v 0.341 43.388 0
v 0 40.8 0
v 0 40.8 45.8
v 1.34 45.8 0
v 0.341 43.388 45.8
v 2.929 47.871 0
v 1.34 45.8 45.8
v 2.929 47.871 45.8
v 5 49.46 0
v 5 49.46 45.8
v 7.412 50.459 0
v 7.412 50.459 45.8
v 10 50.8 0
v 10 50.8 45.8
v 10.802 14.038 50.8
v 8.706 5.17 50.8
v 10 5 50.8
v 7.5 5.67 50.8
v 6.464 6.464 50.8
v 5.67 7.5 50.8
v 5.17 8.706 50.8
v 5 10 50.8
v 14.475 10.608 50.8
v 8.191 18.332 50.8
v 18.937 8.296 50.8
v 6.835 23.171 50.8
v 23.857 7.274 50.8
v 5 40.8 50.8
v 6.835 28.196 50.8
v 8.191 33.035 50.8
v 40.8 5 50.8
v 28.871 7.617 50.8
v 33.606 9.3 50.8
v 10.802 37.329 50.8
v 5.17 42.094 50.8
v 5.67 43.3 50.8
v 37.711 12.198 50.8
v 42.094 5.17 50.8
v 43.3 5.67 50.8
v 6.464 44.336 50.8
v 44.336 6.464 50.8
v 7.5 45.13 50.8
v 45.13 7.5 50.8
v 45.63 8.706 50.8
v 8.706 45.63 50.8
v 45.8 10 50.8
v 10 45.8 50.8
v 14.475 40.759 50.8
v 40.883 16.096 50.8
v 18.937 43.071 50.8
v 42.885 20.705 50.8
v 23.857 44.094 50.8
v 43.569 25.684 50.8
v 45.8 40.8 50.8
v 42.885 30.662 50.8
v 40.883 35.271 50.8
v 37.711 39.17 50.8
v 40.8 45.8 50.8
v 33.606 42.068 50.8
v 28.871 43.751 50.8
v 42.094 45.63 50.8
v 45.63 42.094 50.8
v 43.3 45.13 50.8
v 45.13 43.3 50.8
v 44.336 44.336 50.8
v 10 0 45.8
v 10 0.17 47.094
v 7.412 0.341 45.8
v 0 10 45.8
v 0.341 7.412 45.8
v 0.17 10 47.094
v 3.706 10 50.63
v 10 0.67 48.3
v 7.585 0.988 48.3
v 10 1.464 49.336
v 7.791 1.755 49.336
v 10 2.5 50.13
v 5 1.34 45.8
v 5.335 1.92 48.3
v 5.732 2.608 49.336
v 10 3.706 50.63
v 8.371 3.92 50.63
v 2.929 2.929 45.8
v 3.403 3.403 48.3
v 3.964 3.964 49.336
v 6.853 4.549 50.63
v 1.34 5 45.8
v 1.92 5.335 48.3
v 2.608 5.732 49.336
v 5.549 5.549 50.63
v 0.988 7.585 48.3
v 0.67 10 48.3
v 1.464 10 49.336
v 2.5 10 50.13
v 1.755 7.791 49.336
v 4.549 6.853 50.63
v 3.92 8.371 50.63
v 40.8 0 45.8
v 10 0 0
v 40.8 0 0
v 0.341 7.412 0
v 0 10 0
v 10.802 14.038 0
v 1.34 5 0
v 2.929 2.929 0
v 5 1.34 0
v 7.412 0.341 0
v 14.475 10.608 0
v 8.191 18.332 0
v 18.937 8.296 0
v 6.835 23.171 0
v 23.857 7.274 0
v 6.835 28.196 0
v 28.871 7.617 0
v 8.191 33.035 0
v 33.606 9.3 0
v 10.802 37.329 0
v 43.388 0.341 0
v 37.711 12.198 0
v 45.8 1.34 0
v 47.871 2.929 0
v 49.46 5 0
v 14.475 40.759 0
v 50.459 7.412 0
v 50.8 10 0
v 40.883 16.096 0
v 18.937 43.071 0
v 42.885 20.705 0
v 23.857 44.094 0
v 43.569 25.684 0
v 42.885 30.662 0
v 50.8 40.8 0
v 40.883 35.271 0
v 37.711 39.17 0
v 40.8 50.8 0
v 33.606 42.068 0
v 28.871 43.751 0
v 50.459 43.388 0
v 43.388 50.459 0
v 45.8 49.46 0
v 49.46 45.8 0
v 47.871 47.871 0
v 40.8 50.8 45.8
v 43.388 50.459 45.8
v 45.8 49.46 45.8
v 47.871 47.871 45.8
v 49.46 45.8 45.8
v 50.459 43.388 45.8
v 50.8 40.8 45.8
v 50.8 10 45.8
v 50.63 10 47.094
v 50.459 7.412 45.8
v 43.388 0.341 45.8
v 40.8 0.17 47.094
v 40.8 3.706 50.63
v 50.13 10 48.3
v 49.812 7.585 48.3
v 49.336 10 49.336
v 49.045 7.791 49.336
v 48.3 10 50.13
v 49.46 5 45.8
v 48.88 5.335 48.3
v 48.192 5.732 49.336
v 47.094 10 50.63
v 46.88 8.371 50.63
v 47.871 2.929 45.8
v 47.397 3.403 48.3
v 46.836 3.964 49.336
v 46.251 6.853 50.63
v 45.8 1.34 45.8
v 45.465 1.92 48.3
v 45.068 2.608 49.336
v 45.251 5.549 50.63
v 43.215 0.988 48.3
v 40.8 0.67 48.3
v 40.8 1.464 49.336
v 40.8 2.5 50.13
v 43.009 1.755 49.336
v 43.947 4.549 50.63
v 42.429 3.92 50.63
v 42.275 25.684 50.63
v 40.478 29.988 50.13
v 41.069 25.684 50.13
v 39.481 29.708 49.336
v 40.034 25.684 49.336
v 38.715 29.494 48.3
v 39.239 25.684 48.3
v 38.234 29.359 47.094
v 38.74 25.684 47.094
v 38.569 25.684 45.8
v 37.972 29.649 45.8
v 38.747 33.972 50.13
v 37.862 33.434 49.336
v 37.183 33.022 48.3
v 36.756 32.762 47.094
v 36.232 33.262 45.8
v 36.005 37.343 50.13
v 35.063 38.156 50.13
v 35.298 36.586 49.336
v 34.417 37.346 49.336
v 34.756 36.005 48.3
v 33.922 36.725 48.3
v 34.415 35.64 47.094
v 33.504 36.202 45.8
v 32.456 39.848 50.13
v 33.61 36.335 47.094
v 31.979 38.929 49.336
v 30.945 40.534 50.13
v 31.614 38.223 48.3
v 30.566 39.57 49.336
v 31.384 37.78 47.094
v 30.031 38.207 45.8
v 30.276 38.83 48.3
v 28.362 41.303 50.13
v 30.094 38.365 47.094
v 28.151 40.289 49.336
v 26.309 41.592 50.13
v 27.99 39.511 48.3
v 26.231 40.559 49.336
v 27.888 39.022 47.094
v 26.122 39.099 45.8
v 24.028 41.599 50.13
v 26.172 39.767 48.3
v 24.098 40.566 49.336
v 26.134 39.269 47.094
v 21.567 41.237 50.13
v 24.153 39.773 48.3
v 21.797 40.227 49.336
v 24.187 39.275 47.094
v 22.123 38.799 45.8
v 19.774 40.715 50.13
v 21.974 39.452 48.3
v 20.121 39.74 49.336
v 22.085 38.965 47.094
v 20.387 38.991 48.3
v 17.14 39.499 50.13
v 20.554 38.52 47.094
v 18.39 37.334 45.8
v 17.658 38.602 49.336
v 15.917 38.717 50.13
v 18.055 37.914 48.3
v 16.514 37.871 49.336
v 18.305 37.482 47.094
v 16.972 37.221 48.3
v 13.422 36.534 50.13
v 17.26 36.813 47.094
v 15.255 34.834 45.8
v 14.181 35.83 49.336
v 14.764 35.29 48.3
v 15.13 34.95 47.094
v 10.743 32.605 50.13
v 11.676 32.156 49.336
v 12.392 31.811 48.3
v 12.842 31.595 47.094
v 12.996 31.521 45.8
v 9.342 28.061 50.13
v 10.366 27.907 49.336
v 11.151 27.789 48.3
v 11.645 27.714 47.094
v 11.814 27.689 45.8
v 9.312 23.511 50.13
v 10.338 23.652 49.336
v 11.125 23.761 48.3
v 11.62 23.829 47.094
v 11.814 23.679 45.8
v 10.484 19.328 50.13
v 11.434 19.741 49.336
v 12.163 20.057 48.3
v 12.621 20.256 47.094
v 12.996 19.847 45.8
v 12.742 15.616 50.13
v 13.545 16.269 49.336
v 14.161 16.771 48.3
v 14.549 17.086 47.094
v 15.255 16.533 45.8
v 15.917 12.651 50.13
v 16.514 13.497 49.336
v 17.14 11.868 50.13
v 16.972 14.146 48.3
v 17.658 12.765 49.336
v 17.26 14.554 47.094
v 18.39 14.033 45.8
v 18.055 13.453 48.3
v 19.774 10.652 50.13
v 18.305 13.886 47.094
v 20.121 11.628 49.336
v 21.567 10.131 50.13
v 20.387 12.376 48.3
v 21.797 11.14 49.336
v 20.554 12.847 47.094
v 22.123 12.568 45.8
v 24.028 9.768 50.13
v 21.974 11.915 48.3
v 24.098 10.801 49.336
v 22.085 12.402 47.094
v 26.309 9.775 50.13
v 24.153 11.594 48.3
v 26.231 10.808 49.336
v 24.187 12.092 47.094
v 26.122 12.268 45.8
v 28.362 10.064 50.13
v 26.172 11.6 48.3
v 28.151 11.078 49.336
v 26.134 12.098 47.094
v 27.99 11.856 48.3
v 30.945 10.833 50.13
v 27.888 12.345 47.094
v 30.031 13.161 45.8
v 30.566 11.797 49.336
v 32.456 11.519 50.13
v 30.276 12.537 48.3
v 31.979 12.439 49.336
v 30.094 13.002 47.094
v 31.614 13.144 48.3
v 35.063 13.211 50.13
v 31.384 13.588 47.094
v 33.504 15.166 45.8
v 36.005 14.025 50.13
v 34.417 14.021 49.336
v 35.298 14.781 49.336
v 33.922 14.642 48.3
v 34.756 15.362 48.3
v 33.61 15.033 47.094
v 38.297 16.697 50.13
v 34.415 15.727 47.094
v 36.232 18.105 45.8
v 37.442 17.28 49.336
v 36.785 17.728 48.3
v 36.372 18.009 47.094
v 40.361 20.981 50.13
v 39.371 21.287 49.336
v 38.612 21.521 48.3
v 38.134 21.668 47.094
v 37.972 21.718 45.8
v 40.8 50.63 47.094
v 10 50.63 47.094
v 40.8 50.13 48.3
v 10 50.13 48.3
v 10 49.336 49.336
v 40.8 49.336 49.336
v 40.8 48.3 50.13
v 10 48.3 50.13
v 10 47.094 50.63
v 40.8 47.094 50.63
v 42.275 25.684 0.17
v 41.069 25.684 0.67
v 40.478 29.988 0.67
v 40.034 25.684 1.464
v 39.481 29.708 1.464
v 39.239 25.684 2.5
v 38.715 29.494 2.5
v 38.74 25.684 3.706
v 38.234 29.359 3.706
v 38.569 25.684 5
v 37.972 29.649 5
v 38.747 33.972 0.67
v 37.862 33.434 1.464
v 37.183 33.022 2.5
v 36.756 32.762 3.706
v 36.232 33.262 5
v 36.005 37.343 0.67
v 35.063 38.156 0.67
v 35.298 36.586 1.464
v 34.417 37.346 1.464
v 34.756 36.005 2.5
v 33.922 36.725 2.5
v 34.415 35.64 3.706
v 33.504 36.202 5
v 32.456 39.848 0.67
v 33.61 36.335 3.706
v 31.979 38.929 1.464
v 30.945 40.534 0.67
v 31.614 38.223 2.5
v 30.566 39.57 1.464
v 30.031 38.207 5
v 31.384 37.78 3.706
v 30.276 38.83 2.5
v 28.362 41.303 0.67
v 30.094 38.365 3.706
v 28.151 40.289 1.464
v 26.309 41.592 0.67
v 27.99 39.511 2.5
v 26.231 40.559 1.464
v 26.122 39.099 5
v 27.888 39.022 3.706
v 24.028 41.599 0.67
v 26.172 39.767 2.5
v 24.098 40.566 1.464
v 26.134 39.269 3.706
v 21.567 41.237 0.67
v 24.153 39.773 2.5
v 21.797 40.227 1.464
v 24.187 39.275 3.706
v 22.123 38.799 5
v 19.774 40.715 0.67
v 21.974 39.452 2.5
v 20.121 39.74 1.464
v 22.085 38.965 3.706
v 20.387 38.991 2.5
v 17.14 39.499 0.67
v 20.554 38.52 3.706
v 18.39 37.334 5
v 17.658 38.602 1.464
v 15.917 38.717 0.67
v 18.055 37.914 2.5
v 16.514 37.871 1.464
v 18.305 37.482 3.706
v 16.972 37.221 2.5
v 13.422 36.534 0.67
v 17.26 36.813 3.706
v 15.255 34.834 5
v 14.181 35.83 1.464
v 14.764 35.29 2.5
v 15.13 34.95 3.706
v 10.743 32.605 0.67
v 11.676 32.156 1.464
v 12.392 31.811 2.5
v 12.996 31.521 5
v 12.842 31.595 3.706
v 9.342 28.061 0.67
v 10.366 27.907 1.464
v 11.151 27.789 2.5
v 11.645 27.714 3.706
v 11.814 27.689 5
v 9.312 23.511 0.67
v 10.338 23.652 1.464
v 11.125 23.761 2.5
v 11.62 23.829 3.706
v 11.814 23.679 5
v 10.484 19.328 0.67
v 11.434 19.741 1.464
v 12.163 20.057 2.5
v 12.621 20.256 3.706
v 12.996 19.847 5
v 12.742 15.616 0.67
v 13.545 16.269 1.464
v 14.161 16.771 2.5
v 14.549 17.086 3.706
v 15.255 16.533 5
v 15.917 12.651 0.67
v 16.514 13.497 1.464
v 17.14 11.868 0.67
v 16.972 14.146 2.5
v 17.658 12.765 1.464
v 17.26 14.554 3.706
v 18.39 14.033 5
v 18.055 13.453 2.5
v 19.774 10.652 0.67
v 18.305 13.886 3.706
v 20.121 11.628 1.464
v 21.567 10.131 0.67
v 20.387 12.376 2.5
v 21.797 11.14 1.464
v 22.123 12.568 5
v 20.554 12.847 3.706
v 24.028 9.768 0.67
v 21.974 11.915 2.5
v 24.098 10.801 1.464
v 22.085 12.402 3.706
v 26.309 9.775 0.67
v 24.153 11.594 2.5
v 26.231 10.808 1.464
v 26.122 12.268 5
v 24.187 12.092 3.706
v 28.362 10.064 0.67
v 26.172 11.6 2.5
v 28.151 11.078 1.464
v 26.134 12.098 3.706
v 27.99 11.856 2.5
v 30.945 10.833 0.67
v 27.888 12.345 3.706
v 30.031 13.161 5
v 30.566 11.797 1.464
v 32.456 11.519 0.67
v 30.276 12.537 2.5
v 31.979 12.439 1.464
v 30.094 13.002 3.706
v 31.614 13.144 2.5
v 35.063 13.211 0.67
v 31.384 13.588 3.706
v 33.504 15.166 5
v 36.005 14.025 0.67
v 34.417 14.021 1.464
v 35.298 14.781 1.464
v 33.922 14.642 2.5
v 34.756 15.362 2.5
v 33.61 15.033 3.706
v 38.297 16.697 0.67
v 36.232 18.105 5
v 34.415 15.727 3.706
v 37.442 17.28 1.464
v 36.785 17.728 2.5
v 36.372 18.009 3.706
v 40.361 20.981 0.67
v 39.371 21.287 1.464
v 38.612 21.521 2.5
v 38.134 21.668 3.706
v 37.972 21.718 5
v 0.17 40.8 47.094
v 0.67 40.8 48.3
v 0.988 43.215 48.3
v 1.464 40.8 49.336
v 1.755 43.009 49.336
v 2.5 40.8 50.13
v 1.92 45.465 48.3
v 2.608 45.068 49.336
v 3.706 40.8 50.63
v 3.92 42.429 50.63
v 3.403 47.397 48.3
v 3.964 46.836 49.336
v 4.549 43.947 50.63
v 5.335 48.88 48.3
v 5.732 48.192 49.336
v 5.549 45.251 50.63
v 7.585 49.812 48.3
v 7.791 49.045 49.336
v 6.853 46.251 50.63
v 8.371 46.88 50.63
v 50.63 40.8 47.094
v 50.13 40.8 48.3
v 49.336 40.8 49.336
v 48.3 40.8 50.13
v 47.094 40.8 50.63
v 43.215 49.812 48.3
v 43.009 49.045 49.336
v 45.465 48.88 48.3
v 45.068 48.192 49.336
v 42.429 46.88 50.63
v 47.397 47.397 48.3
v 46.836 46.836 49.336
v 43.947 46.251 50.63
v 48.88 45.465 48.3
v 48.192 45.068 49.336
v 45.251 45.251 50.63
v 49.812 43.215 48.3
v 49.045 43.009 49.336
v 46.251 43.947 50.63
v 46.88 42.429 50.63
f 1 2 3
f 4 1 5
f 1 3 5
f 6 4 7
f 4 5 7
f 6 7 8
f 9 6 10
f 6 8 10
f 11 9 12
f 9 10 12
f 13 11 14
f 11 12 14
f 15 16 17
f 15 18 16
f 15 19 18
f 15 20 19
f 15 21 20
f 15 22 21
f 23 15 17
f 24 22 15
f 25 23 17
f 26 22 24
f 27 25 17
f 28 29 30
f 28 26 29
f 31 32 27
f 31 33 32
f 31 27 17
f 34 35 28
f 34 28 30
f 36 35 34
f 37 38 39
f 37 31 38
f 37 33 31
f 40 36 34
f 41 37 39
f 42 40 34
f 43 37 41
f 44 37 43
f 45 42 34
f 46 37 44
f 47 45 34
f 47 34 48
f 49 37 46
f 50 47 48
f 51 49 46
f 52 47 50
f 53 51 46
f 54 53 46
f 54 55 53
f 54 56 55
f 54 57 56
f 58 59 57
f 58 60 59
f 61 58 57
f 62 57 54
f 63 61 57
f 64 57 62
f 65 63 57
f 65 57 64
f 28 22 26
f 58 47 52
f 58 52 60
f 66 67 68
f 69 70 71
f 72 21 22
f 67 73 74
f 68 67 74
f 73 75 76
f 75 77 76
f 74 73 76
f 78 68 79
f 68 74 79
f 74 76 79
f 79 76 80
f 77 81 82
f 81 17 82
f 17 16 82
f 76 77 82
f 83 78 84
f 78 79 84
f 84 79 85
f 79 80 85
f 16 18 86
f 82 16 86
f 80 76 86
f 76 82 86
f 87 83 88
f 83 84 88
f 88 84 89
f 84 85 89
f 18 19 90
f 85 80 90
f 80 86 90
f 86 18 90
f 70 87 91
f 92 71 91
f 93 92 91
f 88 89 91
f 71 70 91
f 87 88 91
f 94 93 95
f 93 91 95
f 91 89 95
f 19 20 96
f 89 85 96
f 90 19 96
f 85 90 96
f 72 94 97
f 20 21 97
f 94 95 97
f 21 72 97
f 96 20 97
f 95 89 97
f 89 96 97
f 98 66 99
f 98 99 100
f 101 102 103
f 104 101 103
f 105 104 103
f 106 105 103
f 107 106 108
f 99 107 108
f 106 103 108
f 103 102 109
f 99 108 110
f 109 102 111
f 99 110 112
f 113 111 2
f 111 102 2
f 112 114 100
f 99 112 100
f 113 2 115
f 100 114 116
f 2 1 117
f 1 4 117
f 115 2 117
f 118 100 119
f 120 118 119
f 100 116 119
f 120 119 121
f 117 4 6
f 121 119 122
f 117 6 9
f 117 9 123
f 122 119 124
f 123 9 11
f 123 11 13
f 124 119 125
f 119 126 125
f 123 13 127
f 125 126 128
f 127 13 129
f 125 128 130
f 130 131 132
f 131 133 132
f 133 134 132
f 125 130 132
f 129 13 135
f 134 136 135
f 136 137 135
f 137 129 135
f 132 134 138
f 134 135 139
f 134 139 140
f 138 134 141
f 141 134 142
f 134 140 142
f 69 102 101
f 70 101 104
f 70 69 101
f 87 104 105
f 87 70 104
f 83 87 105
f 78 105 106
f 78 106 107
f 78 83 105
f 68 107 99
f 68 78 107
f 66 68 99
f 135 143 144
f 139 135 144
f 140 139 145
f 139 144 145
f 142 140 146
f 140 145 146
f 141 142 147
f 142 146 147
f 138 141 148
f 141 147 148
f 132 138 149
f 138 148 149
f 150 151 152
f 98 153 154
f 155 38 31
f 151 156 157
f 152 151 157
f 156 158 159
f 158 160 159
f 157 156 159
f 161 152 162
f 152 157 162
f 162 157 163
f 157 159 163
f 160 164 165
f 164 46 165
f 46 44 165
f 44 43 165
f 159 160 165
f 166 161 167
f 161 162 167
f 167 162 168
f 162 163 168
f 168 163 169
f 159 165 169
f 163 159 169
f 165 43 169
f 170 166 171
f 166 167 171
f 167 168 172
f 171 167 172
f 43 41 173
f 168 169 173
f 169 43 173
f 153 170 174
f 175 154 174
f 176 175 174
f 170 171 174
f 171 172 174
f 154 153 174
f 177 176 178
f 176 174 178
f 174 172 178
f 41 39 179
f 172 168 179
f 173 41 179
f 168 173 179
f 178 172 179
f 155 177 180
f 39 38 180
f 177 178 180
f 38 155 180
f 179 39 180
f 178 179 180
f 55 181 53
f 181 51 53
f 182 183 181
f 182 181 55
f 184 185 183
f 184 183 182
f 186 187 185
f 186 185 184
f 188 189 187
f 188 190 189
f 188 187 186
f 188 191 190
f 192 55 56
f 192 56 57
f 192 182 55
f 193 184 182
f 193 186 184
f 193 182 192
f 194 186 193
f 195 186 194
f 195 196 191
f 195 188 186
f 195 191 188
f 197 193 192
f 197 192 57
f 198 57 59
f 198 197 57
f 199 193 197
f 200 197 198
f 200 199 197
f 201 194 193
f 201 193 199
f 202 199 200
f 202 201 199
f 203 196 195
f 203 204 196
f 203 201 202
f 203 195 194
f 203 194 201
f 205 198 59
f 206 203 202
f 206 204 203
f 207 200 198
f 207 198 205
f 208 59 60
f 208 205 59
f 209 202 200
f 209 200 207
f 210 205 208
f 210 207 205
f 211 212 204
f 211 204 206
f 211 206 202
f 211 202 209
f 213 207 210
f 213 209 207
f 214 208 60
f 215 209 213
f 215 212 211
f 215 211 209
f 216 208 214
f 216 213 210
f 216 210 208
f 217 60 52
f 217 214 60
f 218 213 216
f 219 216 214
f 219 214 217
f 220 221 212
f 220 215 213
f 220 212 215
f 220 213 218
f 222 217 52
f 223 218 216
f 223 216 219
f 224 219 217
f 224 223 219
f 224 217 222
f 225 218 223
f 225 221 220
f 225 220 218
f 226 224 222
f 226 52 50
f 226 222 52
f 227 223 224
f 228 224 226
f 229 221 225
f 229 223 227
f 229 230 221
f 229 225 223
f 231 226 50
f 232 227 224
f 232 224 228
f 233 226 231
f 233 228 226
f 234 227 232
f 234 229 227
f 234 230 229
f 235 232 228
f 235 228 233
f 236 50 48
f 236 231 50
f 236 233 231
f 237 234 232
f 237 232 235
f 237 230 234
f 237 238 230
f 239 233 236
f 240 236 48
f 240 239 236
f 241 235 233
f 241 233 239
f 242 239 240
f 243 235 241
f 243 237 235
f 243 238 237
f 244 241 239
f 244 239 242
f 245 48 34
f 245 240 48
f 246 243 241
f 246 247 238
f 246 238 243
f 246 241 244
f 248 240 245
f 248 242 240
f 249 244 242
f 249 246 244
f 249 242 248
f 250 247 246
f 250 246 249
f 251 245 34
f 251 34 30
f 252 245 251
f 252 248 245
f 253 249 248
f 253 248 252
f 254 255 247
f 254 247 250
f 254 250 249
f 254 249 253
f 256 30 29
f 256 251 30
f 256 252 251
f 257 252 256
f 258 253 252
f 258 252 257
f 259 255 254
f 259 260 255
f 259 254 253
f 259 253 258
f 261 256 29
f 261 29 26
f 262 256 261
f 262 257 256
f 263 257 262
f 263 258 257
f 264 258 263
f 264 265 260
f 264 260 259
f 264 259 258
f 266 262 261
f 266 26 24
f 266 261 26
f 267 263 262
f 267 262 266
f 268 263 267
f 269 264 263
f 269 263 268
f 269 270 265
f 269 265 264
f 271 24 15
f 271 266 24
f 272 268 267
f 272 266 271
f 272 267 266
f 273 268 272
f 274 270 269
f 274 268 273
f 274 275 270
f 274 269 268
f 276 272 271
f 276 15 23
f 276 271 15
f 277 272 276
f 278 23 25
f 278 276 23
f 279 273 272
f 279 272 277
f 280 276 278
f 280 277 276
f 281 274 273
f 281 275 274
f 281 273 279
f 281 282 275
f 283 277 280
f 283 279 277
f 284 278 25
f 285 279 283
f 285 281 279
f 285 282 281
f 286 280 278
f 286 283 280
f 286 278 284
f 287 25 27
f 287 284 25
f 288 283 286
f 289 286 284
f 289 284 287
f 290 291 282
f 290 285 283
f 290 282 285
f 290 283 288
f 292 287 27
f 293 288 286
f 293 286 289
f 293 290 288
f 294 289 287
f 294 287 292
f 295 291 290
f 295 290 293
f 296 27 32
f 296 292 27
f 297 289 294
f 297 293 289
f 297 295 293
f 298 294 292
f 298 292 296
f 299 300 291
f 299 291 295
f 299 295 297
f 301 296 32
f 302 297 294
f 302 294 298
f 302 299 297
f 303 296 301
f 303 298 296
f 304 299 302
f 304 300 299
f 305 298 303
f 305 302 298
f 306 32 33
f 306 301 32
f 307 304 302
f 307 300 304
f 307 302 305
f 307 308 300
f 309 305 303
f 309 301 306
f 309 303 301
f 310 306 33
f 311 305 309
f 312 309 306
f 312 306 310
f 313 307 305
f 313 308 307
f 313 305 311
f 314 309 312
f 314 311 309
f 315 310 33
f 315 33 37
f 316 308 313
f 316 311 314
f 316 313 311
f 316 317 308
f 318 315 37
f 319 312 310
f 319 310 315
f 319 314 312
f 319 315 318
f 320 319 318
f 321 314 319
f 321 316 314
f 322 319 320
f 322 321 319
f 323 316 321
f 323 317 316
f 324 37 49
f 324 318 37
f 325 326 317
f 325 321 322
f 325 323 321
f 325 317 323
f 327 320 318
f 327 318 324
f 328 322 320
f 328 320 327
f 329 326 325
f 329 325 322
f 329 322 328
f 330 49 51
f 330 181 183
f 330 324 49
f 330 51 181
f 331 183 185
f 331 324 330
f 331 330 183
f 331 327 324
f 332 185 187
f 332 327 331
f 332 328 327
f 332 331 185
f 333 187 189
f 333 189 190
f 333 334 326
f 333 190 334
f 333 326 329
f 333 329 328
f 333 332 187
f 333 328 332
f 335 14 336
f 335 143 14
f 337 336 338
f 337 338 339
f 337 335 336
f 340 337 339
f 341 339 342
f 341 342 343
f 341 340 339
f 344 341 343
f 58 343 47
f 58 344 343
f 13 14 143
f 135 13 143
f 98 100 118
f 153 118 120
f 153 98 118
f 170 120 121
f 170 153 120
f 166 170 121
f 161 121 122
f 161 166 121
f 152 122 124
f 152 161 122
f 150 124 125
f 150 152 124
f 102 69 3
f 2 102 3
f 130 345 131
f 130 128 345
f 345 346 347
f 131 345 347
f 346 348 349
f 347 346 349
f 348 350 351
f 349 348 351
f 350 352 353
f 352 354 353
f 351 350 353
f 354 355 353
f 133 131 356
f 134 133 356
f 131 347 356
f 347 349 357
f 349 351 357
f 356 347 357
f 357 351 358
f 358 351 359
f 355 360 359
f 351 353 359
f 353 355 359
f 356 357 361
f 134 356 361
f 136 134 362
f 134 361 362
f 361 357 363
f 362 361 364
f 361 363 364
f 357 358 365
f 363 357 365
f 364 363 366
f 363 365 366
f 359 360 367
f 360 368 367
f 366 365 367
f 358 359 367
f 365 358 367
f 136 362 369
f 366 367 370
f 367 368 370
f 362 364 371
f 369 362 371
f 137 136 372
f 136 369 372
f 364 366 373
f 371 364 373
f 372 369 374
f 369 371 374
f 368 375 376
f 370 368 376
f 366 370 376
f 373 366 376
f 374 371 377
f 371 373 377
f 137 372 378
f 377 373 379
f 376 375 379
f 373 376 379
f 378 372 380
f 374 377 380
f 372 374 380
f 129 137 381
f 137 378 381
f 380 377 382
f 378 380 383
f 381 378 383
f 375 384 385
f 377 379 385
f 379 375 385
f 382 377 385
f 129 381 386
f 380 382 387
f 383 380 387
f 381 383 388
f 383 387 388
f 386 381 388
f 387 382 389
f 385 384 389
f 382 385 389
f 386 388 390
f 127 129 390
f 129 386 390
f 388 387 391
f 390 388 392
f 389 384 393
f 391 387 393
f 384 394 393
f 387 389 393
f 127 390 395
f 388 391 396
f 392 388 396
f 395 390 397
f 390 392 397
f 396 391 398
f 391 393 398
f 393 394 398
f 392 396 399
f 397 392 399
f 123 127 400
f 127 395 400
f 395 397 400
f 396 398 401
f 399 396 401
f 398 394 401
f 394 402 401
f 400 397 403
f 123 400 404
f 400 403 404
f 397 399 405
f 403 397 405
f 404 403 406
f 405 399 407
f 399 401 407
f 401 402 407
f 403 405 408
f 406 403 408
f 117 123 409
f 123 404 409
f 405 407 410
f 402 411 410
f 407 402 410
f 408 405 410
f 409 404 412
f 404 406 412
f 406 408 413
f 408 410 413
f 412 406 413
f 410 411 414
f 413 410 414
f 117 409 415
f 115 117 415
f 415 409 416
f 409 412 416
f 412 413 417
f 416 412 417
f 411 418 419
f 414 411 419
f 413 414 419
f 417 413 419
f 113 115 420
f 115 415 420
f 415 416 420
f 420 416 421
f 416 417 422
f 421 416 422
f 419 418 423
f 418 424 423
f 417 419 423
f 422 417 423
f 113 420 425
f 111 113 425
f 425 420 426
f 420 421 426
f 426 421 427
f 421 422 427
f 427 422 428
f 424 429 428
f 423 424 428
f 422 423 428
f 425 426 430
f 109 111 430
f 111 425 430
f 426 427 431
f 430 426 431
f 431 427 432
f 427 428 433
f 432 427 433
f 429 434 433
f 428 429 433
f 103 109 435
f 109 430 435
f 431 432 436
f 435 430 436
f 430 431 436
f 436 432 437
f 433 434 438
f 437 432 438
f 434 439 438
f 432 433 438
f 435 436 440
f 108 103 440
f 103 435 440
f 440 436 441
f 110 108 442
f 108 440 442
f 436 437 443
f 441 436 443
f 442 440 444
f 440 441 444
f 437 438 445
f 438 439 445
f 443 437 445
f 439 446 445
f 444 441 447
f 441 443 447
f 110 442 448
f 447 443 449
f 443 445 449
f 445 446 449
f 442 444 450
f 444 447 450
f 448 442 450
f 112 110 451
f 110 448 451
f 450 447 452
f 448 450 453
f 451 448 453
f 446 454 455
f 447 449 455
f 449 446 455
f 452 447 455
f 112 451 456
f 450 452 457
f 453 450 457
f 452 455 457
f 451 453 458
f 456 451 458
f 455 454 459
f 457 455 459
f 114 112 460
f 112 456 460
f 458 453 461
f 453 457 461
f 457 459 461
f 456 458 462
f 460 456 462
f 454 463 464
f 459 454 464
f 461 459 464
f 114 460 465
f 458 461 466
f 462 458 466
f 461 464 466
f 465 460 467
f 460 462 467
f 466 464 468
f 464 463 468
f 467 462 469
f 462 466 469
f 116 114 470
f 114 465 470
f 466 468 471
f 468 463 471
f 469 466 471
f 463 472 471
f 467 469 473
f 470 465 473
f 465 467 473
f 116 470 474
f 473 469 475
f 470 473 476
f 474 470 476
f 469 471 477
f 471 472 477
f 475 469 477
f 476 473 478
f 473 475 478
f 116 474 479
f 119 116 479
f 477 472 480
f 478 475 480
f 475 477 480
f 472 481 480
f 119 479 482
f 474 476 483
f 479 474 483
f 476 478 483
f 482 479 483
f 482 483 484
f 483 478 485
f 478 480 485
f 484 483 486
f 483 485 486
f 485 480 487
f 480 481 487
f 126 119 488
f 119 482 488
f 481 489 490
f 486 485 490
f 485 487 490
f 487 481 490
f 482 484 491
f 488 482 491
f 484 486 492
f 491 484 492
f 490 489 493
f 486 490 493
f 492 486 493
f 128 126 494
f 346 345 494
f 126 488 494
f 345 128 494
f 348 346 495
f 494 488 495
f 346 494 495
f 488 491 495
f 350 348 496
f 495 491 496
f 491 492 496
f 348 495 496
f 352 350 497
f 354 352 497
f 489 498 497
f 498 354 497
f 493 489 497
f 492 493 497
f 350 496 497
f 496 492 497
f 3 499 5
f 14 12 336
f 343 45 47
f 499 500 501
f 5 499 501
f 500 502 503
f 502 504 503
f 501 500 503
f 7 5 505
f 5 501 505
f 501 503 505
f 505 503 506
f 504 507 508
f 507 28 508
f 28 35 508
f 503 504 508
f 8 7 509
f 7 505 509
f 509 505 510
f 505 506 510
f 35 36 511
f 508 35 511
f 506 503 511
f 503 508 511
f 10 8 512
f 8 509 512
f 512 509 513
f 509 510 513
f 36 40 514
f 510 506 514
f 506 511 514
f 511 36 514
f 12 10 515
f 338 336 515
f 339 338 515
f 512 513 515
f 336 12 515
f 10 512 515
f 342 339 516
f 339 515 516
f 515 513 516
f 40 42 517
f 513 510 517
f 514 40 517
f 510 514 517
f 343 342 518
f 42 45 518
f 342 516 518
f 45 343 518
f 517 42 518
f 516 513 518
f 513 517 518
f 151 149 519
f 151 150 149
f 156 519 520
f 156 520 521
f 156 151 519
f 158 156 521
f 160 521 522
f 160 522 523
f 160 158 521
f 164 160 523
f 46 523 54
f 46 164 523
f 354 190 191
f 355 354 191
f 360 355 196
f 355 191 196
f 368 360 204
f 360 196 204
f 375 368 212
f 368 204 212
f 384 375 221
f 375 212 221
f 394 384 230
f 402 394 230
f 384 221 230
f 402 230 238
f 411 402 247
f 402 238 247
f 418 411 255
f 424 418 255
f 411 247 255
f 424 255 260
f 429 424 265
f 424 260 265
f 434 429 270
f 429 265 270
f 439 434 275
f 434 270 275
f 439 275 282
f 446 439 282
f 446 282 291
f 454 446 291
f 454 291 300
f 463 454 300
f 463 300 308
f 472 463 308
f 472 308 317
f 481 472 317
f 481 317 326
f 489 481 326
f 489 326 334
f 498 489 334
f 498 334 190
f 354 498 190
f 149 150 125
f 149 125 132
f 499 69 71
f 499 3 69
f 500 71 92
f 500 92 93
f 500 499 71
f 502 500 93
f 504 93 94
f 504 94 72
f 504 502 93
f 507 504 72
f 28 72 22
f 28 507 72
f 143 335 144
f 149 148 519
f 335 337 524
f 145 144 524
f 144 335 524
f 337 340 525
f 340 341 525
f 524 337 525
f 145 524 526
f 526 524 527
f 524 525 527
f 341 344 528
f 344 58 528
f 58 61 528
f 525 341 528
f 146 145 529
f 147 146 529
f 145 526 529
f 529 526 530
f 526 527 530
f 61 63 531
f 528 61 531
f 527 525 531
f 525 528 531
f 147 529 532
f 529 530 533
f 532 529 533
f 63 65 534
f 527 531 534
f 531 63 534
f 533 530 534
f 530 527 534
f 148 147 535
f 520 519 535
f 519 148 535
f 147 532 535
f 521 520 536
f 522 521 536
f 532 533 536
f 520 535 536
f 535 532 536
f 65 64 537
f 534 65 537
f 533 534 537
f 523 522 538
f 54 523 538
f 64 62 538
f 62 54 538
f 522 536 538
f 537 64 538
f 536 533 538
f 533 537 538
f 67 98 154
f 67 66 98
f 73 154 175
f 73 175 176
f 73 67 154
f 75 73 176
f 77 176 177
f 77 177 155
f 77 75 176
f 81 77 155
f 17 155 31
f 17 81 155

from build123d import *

# Parameters (mm, degrees)
F0_W     = 50.8
F0_H     = 50.8
F1_DEPTH = 50.8
F2_R     = 13.4529093532
F3_DEPTH = 50.801
F4_R     = 10
F5_R     = 5


with BuildPart() as f1:
    # F0 (on Top) → F1 (new body)
    with BuildSketch(Plane.XY):
        with Locations((25.4, 25.4)):
            Rectangle(F0_W, F0_H)
    extrude(amount=F1_DEPTH)

    # F2 (on face) → F3 (cut, through all)
    with BuildSketch(Plane.XY.offset(50.8)):
        with Locations((25.1163877547, 25.6836116314)):
            Circle(F2_R)
    extrude(amount=-F3_DEPTH, mode=Mode.SUBTRACT)

    # F4
    f4_edges = [f1.edges().sort_by_distance(p)[0] for p in [
        (50.8, 50.8, 25.4),
        (50.8, 0, 25.4),
        (0, 50.8, 25.4),
        (0, 0, 25.4),
    ]]
    fillet(f4_edges, radius=F4_R)

    # F5
    f5_edges = [f1.edges().sort_by_distance(p)[0] for p in [
        (11.663478, 25.683612, 50.8),
        (11.663478, 25.683612, 0),
        (0, 25.4, 50.8),
        (2.928932, 47.871068, 50.8),
        (2.928932, 2.928932, 50.8),
        (25.4, 50.8, 50.8),
        (25.4, 0, 50.8),
        (47.871068, 47.871068, 50.8),
        (47.871068, 2.928932, 50.8),
        (50.8, 25.4, 50.8),
    ]]
    fillet(f5_edges, radius=F5_R)


solid = f1.part
